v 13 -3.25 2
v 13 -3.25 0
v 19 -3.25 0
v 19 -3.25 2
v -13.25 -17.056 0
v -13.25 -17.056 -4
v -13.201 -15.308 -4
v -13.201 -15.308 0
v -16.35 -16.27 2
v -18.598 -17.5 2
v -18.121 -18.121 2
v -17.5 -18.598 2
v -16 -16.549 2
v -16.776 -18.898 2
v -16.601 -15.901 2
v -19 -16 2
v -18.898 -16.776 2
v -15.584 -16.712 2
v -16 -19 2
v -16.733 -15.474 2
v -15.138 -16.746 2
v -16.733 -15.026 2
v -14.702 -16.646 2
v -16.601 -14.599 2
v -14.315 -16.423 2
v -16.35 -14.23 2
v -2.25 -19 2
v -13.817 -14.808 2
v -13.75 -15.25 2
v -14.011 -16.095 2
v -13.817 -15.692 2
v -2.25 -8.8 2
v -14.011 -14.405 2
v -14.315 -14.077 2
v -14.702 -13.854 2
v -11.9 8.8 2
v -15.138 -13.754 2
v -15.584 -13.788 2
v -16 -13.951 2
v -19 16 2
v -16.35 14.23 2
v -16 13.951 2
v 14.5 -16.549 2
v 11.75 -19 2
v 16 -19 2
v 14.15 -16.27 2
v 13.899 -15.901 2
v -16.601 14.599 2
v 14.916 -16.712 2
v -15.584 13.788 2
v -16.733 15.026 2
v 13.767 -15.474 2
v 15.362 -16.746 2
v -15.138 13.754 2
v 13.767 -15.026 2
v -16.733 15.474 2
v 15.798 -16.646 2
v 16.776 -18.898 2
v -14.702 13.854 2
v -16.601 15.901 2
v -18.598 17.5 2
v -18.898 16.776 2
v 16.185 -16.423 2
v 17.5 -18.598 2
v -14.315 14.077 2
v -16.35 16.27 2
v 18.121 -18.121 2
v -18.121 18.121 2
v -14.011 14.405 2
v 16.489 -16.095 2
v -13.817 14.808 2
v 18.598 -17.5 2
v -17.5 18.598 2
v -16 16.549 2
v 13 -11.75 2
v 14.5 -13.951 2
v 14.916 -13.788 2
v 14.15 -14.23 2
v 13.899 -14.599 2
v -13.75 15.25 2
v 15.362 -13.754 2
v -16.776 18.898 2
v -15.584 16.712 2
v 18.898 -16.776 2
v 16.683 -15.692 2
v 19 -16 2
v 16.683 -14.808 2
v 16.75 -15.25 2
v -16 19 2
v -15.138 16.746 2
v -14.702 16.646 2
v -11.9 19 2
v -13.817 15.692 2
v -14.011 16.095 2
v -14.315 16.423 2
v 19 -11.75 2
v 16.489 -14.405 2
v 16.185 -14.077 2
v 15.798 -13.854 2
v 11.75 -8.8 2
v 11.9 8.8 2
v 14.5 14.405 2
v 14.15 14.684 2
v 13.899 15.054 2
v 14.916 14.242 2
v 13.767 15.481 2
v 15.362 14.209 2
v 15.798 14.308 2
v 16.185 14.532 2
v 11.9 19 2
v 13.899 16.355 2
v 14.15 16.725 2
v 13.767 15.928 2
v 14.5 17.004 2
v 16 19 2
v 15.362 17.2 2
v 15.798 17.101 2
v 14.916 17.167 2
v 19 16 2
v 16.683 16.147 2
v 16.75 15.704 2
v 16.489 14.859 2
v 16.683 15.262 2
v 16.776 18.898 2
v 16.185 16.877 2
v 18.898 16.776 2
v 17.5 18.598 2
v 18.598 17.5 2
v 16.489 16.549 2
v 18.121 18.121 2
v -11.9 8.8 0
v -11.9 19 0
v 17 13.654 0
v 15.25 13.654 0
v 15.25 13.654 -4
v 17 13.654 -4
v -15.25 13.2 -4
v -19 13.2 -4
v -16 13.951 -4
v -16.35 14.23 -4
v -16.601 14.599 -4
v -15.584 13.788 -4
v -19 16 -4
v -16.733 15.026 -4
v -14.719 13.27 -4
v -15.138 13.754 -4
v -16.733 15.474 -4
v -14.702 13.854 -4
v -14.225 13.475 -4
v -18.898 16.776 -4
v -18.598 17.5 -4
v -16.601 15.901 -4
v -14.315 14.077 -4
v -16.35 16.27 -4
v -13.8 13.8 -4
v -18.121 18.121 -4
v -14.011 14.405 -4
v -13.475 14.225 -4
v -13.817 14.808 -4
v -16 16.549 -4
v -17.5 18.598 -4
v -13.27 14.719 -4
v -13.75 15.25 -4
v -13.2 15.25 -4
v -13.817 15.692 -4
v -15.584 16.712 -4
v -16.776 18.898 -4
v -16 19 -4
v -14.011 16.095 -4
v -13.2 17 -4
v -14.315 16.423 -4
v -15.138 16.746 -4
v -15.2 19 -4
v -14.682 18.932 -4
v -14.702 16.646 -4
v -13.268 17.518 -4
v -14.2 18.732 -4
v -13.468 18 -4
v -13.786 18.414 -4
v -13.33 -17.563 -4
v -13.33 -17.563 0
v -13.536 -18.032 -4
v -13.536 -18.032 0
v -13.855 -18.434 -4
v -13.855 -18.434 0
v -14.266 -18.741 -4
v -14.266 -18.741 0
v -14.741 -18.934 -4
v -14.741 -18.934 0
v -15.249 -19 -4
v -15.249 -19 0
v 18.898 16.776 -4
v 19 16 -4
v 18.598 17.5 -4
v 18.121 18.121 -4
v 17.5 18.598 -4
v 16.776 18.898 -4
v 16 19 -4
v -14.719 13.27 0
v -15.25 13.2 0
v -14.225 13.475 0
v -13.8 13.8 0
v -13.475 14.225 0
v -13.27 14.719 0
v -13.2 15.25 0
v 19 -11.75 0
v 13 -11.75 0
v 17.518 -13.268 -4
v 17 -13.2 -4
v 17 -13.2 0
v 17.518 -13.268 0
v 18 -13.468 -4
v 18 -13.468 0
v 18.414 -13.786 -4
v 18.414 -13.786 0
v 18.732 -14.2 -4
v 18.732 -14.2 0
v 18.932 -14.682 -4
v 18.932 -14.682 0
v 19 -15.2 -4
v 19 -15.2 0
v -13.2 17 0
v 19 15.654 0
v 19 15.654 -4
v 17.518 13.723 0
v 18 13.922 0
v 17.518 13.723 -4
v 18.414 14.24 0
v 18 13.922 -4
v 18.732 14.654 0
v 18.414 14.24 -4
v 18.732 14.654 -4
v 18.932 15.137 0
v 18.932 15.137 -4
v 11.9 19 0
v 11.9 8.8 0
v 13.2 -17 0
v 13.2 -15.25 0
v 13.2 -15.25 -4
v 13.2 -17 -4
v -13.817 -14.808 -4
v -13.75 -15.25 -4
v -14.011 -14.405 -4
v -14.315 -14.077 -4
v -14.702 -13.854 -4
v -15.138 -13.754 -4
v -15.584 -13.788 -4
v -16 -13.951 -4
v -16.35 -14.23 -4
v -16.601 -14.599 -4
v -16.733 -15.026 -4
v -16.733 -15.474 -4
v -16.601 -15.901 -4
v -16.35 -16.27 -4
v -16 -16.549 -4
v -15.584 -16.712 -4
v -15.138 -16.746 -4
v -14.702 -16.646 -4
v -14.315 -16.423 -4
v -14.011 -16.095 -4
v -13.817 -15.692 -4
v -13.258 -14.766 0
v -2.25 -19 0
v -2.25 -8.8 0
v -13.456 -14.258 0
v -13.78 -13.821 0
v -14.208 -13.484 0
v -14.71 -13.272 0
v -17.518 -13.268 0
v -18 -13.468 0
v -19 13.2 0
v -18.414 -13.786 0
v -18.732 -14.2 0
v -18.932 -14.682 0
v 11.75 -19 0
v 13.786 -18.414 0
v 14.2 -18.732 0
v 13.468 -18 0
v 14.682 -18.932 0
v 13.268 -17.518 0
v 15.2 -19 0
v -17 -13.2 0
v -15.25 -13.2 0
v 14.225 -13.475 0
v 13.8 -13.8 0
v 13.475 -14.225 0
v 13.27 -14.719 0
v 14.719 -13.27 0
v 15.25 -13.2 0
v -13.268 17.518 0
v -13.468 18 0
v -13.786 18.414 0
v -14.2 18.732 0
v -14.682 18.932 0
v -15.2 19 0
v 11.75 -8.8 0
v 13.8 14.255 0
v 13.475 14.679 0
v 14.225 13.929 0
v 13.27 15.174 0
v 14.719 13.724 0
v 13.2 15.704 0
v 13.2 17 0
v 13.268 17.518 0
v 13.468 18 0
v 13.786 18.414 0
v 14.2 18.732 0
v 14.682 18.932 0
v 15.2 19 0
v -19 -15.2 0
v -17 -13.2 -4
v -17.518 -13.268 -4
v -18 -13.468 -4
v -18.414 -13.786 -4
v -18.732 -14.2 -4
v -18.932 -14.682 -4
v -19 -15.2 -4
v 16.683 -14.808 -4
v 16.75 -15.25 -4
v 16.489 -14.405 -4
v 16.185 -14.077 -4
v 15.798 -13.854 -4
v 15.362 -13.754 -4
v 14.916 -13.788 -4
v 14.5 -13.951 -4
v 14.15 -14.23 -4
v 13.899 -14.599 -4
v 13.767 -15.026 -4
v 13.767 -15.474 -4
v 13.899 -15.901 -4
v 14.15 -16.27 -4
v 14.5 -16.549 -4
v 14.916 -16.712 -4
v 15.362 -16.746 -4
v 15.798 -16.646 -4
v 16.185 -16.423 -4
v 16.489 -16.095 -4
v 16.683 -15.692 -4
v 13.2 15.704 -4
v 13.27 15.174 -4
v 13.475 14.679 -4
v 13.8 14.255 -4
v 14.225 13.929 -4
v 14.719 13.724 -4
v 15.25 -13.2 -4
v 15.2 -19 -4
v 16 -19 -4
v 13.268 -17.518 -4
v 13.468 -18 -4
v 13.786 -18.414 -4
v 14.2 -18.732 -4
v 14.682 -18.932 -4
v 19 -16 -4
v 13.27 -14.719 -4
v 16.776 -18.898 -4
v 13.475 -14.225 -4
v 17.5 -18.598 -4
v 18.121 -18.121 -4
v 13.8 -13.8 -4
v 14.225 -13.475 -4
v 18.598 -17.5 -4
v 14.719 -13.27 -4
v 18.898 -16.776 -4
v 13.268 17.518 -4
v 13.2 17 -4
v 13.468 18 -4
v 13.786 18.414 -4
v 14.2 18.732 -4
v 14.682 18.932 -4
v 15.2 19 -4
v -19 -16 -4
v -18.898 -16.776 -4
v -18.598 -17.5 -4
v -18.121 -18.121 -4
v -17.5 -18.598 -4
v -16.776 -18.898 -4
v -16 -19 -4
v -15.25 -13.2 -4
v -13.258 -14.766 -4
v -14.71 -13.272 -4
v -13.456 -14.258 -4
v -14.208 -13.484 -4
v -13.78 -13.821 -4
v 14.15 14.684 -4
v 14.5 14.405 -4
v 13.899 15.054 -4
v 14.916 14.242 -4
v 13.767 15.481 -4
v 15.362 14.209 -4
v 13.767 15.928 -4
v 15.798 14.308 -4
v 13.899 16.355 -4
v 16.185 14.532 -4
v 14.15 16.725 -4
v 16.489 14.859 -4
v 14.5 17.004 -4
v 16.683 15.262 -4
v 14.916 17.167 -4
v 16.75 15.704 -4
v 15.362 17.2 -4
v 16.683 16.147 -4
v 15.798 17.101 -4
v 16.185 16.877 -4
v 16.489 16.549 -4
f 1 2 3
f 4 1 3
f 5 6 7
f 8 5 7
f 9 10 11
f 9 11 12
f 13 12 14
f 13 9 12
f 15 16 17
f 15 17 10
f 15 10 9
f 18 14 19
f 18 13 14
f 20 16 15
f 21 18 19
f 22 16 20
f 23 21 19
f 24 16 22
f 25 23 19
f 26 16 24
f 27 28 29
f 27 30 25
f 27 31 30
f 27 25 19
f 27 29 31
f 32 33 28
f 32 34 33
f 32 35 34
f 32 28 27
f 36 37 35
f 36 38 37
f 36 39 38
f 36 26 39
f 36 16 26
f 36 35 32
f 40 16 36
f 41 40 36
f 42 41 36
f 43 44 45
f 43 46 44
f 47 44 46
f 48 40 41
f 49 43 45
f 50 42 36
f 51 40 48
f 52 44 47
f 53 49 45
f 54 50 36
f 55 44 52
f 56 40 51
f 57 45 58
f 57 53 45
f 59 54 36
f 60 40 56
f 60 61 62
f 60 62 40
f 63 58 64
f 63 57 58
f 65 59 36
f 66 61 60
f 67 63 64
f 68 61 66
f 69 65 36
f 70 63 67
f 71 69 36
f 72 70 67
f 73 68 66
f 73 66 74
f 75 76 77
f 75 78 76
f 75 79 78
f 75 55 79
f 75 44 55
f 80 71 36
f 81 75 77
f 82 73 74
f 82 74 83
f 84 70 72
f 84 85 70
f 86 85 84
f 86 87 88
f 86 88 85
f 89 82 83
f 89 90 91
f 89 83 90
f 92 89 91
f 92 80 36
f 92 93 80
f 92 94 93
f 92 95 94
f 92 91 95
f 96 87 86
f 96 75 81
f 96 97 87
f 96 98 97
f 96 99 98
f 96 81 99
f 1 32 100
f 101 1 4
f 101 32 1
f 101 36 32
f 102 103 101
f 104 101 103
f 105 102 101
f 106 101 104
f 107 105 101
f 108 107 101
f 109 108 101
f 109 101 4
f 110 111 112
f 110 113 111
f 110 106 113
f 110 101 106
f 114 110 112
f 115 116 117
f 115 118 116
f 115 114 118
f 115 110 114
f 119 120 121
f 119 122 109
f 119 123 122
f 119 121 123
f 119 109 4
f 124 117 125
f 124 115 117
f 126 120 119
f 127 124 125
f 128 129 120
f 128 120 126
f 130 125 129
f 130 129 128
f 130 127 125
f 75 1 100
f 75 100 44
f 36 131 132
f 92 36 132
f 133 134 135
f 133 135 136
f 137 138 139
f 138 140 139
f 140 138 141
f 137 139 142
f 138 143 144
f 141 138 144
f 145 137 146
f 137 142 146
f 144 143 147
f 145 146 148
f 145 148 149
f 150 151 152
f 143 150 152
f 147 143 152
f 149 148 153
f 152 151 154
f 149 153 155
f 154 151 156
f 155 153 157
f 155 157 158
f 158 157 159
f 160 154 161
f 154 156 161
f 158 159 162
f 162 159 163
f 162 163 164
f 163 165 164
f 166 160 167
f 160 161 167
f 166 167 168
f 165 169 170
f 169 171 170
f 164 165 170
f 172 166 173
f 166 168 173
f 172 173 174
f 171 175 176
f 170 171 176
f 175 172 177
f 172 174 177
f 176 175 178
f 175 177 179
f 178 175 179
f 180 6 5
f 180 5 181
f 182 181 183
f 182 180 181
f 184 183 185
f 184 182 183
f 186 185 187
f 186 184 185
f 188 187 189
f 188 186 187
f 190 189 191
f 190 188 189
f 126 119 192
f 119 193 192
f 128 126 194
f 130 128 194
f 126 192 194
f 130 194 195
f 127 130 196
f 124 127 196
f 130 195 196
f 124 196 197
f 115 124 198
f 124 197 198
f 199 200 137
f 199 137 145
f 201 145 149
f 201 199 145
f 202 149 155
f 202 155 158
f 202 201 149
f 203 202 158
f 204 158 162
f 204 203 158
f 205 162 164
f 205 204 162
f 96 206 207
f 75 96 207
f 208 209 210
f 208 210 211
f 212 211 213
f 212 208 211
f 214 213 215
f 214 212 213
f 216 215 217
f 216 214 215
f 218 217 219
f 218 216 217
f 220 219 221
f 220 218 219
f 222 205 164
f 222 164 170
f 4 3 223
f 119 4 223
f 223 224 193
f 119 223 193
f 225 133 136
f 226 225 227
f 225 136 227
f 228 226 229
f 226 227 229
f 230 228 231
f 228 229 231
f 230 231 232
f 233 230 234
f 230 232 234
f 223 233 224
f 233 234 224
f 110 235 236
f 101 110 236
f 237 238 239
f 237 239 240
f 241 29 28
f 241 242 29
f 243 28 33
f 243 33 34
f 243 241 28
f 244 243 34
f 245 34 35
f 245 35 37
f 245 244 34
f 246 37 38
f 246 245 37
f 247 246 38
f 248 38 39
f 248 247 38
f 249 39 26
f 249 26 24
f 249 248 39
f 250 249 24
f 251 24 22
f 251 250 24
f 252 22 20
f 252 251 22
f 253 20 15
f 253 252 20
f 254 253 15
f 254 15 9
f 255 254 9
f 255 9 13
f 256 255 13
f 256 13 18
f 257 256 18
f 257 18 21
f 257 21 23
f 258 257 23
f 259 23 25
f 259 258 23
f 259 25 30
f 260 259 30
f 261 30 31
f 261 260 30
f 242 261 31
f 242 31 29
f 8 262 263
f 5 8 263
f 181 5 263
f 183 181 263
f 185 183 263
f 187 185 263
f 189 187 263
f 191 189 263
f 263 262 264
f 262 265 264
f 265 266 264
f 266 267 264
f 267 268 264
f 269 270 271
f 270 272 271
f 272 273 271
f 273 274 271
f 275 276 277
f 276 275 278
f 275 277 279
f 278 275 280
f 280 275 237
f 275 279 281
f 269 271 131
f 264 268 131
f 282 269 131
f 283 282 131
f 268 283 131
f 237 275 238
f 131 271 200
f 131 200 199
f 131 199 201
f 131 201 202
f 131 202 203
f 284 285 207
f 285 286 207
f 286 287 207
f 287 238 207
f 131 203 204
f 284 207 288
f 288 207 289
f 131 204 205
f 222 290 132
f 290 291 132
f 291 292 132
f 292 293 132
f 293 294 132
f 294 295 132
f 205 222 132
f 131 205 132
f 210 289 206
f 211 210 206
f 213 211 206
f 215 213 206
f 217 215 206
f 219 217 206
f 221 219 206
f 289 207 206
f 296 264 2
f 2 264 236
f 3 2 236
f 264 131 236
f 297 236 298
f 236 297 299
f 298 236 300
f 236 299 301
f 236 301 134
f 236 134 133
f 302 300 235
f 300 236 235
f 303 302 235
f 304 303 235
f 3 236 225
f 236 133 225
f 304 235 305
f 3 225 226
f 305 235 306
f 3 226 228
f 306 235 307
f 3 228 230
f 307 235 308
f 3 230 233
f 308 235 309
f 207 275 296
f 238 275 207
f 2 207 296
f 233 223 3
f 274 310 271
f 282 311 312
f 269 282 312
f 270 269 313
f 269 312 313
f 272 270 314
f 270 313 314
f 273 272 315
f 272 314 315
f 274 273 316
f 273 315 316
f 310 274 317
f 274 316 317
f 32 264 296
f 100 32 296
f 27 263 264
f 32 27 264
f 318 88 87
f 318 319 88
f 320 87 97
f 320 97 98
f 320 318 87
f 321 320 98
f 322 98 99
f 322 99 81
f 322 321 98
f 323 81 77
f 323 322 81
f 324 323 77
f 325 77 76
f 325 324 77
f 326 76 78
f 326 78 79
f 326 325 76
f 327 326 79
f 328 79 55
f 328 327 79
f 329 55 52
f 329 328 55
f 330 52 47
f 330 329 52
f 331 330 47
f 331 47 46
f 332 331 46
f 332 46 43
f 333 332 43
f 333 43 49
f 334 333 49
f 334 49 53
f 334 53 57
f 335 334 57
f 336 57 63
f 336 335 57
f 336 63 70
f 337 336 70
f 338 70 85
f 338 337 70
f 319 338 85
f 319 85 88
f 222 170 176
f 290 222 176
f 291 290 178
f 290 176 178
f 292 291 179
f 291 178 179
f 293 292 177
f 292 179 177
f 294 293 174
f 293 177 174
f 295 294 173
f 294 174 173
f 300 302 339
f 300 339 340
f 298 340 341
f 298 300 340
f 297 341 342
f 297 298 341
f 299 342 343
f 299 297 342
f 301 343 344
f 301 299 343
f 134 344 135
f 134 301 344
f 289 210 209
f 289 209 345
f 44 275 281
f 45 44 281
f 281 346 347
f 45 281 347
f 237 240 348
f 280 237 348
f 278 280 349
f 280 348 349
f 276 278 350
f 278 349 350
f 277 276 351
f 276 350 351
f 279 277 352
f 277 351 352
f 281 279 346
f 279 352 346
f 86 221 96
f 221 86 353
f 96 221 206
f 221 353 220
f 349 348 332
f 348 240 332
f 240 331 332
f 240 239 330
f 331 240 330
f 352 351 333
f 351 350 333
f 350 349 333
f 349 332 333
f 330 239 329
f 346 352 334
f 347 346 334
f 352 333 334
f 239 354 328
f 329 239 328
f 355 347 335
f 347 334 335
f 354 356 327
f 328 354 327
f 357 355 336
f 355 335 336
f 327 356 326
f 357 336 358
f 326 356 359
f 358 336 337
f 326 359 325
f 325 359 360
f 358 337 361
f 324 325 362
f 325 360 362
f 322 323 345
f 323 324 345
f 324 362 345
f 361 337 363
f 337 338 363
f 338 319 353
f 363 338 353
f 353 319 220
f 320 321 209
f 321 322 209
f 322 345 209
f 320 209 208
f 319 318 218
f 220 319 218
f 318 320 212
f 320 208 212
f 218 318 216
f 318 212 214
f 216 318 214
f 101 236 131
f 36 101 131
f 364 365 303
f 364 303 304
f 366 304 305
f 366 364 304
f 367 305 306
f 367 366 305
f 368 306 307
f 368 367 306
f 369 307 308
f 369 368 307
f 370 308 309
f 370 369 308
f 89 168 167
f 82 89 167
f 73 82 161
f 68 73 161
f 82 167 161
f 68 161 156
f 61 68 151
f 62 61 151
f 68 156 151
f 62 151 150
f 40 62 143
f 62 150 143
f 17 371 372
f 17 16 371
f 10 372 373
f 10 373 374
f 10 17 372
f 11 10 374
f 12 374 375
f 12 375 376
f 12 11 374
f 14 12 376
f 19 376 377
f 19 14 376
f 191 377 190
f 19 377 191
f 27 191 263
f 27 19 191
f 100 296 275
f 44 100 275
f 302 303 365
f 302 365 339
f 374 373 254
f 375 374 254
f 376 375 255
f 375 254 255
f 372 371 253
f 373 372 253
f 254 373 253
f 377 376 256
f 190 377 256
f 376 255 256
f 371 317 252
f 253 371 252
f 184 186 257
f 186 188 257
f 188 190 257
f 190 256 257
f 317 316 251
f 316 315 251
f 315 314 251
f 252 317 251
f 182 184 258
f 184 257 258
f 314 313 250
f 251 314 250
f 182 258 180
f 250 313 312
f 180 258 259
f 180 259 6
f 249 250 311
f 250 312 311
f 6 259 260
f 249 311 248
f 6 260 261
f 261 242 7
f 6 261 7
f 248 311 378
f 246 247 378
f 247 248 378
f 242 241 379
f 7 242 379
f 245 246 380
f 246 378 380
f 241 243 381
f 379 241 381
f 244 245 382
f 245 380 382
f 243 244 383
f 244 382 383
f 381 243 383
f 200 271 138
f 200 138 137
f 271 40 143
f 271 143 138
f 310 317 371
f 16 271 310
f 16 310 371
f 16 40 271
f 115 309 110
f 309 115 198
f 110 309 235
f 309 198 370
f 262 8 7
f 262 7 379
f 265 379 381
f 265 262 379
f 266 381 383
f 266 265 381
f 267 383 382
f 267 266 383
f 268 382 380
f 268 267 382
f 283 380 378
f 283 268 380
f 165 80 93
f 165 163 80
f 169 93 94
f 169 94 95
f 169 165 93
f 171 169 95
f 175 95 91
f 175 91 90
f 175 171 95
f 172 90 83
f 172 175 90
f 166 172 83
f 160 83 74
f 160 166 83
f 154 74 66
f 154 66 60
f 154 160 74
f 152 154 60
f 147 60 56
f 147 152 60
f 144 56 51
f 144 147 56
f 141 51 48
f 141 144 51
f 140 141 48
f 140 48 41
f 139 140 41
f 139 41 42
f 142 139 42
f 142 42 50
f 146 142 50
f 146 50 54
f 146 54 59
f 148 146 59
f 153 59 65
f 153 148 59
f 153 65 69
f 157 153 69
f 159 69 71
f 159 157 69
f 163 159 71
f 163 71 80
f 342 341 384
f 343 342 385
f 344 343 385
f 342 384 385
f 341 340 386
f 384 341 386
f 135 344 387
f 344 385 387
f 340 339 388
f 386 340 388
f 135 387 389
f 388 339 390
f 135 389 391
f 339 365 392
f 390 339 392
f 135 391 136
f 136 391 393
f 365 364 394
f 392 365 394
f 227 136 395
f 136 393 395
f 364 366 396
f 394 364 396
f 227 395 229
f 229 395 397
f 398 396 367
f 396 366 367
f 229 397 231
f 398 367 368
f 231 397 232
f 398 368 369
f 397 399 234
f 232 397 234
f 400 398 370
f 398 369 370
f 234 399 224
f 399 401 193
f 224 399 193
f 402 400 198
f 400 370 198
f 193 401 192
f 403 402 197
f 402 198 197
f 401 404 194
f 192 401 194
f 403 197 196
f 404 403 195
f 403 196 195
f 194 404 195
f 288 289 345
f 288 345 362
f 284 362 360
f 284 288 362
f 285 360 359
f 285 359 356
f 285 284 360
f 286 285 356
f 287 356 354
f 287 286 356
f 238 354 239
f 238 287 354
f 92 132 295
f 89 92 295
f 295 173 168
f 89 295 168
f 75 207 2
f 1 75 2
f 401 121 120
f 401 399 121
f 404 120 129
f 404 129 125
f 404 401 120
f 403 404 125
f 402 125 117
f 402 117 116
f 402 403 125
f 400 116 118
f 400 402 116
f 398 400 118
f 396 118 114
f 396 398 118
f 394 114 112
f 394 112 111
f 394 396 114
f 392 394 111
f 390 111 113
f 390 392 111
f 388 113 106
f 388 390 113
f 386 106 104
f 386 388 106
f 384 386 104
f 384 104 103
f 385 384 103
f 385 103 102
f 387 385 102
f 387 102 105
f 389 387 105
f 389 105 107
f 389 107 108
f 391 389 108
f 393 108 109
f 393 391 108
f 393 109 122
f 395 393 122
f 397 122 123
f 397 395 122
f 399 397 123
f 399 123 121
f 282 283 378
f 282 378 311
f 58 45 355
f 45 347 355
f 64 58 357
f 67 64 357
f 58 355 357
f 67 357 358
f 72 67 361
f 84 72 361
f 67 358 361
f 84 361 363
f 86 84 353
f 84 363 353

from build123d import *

# Parameters (mm, degrees)
F0_R        = 1.5
F1_DEPTH    = 2
F2_DEPTH    = 4
F3_T1_DEPTH = 9
F4_T1_DEPTH = 9
F4_T3_DEPTH = 8.8612846748


# Not quite as in the source:
# - a fillet or chamfer that OpenCascade refuses, or shapes differently, is made with other operations: its cross-section is extruded or revolved along the edge and cut away or added


with BuildPart() as f1:
    # F0 (on Top) → F1 (new body)
    with BuildSketch(Plane.XY):
        with BuildLine():
            Line((11.75, -19), (13.2, -19))
            Line((13.2, -19), (13.2, -15.25))
            ThreePointArc((13.2, -15.25), (13.8004310986, -13.8004310986), (15.25, -13.2))
            Line((15.25, -13.2), (19, -13.2))
            Line((19, -13.2), (19, -11.75))
            Line((19, -11.75), (13, -11.75))
            Line((13, -11.75), (13, -3.25))
            Line((13, -3.25), (19, -3.25))
            Line((19, -3.25), (19, 13.6544716179))
            Line((19, 13.6544716179), (15.25, 13.6544716179))
            ThreePointArc((15.25, 13.6544716179), (13.8004310986, 14.2549027165), (13.2, 15.7044716179))
            Line((13.2, 15.7044716179), (13.2, 19))
            Line((13.2, 19), (11.9, 19))
            Line((11.9, 19), (11.9, 8.8))
            Line((11.9, 8.8), (0, 8.8))
            Line((0, 8.8), (-11.9, 8.8))
            Line((-11.9, 8.8), (-11.9, 19))
            Line((-11.9, 19), (-13.2, 19))
            Line((-13.2, 19), (-13.2, 15.25))
            ThreePointArc((-13.2, 15.25), (-13.8004310986, 13.8004310986), (-15.25, 13.2))
            Line((-15.25, 13.2), (-19, 13.2))
            Line((-19, 13.2), (-19, -13.2))
            Line((-19, -13.2), (-15.25, -13.2))
            ThreePointArc((-15.25, -13.2), (-13.7801859172, -13.8209630649), (-13.2008111101, -15.3076618908))
            Line((-13.2008111101, -15.3076618908), (-13.304709388, -19))
            Line((-13.304709388, -19), (-2.25, -19))
            Line((-2.25, -19), (-2.25, -8.8))
            Line((-2.25, -8.8), (11.75, -8.8))
            Line((11.75, -8.8), (11.75, -19))
        make_face()
        with BuildLine():
            Line((-19, 16), (-19, 13.2))
            Line((-19, 13.2), (-15.25, 13.2))
            ThreePointArc((-15.25, 13.2), (-13.8004310986, 13.8004310986), (-13.2, 15.25))
            Line((-13.2, 15.25), (-13.2, 19))
            Line((-13.2, 19), (-16, 19))
            ThreePointArc((-16, 19), (-18.1213203436, 18.1213203436), (-19, 16))
        make_face()
        with Locations((-15.25, 15.25)):
            Circle(F0_R, mode=Mode.SUBTRACT)
        with BuildLine():
            Line((15.25, 13.6544716179), (19, 13.6544716179))
            Line((19, 13.6544716179), (19, 16))
            ThreePointArc((19, 16), (18.1213203436, 18.1213203436), (16, 19))
            Line((16, 19), (13.2, 19))
            Line((13.2, 19), (13.2, 15.7044716179))
            ThreePointArc((13.2, 15.7044716179), (13.8004310986, 14.2549027165), (15.25, 13.6544716179))
        make_face()
        with Locations((15.25, 15.7044716179)):
            Circle(F0_R, mode=Mode.SUBTRACT)
        with BuildLine():
            Line((13.2, -19), (16, -19))
            ThreePointArc((16, -19), (18.1213203436, -18.1213203436), (19, -16))
            Line((19, -16), (19, -13.2))
            Line((19, -13.2), (15.25, -13.2))
            ThreePointArc((15.25, -13.2), (13.8004310986, -13.8004310986), (13.2, -15.25))
            Line((13.2, -15.25), (13.2, -19))
        make_face()
        with Locations((15.25, -15.25)):
            Circle(F0_R, mode=Mode.SUBTRACT)
        with BuildLine():
            Line((-16, -19), (-13.304709388, -19))
            Line((-13.304709388, -19), (-13.2008111101, -15.3076618908))
            ThreePointArc((-13.2008111101, -15.3076618908), (-13.7801859172, -13.8209630649), (-15.25, -13.2))
            Line((-15.25, -13.2), (-19, -13.2))
            Line((-19, -13.2), (-19, -16))
            ThreePointArc((-19, -16), (-18.1213203436, -18.1213203436), (-16, -19))
        make_face()
        with Locations((-15.25, -15.25)):
            Circle(F0_R, mode=Mode.SUBTRACT)
    extrude(amount=F1_DEPTH)

    # F0 (on Top) → F2 (join)
    with BuildSketch(Plane.XY):
        with BuildLine():
            Line((-16, -19), (-13.304709388, -19))
            Line((-13.304709388, -19), (-13.2008111101, -15.3076618908))
            ThreePointArc((-13.2008111101, -15.3076618908), (-13.7801859172, -13.8209630649), (-15.25, -13.2))
            Line((-15.25, -13.2), (-19, -13.2))
            Line((-19, -13.2), (-19, -16))
            ThreePointArc((-19, -16), (-18.1213203436, -18.1213203436), (-16, -19))
        make_face()
        with Locations((-15.25, -15.25)):
            Circle(F0_R, mode=Mode.SUBTRACT)
        with BuildLine():
            Line((13.2, -19), (16, -19))
            ThreePointArc((16, -19), (18.1213203436, -18.1213203436), (19, -16))
            Line((19, -16), (19, -13.2))
            Line((19, -13.2), (15.25, -13.2))
            ThreePointArc((15.25, -13.2), (13.8004310986, -13.8004310986), (13.2, -15.25))
            Line((13.2, -15.25), (13.2, -19))
        make_face()
        with Locations((15.25, -15.25)):
            Circle(F0_R, mode=Mode.SUBTRACT)
        with BuildLine():
            Line((15.25, 13.6544716179), (19, 13.6544716179))
            Line((19, 13.6544716179), (19, 16))
            ThreePointArc((19, 16), (18.1213203436, 18.1213203436), (16, 19))
            Line((16, 19), (13.2, 19))
            Line((13.2, 19), (13.2, 15.7044716179))
            ThreePointArc((13.2, 15.7044716179), (13.8004310986, 14.2549027165), (15.25, 13.6544716179))
        make_face()
        with Locations((15.25, 15.7044716179)):
            Circle(F0_R, mode=Mode.SUBTRACT)
        with BuildLine():
            Line((-19, 16), (-19, 13.2))
            Line((-19, 13.2), (-15.25, 13.2))
            ThreePointArc((-15.25, 13.2), (-13.8004310986, 13.8004310986), (-13.2, 15.25))
            Line((-13.2, 15.25), (-13.2, 19))
            Line((-13.2, 19), (-16, 19))
            ThreePointArc((-16, 19), (-18.1213203436, 18.1213203436), (-19, 16))
        make_face()
        with Locations((-15.25, 15.25)):
            Circle(F0_R, mode=Mode.SUBTRACT)
    extrude(amount=-F2_DEPTH)

    # F3: fillet of radius 2 on 1 edges, made by hand

    # F3_s2 → F3_t1 (cut)
    with BuildSketch(Plane.XY.offset(-9)):
        with BuildLine():
            ThreePointArc((-13.2, 17), (-13.7857864376, 18.4142135624), (-15.2, 19))
            Line((-15.2, 19), (-13.2, 19))
            Line((-13.2, 19), (-13.2, 17))
        make_face()
    extrude(amount=F3_T1_DEPTH, mode=Mode.SUBTRACT)

    # F4: fillet of radius 2 on 6 edges, made by hand

    # F4_s2 → F4_t1 (cut)
    with BuildSketch(Plane.XY.offset(-9)):
        with BuildLine():
            ThreePointArc((13.2, 17), (13.7857864376, 18.4142135624), (15.2, 19))
            Line((15.2, 19), (13.2, 19))
            Line((13.2, 19), (13.2, 17))
        make_face()
        with BuildLine():
            ThreePointArc((17, 13.6544716179), (18.4142135624, 14.2402580556), (19, 15.6544716179))
            Line((19, 15.6544716179), (19, 13.6544716179))
            Line((19, 13.6544716179), (17, 13.6544716179))
        make_face()
        with BuildLine():
            ThreePointArc((17, -13.2), (18.4142135624, -13.7857864376), (19, -15.2))
            Line((19, -15.2), (19, -13.2))
            Line((19, -13.2), (17, -13.2))
        make_face()
        with BuildLine():
            ThreePointArc((13.2, -17), (13.7857864376, -18.4142135624), (15.2, -19))
            Line((15.2, -19), (13.2, -19))
            Line((13.2, -19), (13.2, -17))
        make_face()
        with BuildLine():
            ThreePointArc((-17, -13.2), (-18.4142135624, -13.7857864376), (-19, -15.2))
            Line((-19, -15.2), (-19, -13.2))
            Line((-19, -13.2), (-17, -13.2))
        make_face()
    extrude(amount=F4_T1_DEPTH, mode=Mode.SUBTRACT)

    # F4_s4 → F4_t3 (cut)
    with BuildSketch(Plane.XY.offset(-8.8612846748)):
        with BuildLine():
            ThreePointArc((-13.2500145849, -17.0562555032), (-13.8550408822, -18.4339649588), (-15.249223258, -19))
            Line((-15.249223258, -19), (-13.304709388, -19))
            Line((-13.304709388, -19), (-13.2500145849, -17.0562555032))
        make_face()
    extrude(amount=F4_T3_DEPTH, mode=Mode.SUBTRACT)


solid = f1.part
